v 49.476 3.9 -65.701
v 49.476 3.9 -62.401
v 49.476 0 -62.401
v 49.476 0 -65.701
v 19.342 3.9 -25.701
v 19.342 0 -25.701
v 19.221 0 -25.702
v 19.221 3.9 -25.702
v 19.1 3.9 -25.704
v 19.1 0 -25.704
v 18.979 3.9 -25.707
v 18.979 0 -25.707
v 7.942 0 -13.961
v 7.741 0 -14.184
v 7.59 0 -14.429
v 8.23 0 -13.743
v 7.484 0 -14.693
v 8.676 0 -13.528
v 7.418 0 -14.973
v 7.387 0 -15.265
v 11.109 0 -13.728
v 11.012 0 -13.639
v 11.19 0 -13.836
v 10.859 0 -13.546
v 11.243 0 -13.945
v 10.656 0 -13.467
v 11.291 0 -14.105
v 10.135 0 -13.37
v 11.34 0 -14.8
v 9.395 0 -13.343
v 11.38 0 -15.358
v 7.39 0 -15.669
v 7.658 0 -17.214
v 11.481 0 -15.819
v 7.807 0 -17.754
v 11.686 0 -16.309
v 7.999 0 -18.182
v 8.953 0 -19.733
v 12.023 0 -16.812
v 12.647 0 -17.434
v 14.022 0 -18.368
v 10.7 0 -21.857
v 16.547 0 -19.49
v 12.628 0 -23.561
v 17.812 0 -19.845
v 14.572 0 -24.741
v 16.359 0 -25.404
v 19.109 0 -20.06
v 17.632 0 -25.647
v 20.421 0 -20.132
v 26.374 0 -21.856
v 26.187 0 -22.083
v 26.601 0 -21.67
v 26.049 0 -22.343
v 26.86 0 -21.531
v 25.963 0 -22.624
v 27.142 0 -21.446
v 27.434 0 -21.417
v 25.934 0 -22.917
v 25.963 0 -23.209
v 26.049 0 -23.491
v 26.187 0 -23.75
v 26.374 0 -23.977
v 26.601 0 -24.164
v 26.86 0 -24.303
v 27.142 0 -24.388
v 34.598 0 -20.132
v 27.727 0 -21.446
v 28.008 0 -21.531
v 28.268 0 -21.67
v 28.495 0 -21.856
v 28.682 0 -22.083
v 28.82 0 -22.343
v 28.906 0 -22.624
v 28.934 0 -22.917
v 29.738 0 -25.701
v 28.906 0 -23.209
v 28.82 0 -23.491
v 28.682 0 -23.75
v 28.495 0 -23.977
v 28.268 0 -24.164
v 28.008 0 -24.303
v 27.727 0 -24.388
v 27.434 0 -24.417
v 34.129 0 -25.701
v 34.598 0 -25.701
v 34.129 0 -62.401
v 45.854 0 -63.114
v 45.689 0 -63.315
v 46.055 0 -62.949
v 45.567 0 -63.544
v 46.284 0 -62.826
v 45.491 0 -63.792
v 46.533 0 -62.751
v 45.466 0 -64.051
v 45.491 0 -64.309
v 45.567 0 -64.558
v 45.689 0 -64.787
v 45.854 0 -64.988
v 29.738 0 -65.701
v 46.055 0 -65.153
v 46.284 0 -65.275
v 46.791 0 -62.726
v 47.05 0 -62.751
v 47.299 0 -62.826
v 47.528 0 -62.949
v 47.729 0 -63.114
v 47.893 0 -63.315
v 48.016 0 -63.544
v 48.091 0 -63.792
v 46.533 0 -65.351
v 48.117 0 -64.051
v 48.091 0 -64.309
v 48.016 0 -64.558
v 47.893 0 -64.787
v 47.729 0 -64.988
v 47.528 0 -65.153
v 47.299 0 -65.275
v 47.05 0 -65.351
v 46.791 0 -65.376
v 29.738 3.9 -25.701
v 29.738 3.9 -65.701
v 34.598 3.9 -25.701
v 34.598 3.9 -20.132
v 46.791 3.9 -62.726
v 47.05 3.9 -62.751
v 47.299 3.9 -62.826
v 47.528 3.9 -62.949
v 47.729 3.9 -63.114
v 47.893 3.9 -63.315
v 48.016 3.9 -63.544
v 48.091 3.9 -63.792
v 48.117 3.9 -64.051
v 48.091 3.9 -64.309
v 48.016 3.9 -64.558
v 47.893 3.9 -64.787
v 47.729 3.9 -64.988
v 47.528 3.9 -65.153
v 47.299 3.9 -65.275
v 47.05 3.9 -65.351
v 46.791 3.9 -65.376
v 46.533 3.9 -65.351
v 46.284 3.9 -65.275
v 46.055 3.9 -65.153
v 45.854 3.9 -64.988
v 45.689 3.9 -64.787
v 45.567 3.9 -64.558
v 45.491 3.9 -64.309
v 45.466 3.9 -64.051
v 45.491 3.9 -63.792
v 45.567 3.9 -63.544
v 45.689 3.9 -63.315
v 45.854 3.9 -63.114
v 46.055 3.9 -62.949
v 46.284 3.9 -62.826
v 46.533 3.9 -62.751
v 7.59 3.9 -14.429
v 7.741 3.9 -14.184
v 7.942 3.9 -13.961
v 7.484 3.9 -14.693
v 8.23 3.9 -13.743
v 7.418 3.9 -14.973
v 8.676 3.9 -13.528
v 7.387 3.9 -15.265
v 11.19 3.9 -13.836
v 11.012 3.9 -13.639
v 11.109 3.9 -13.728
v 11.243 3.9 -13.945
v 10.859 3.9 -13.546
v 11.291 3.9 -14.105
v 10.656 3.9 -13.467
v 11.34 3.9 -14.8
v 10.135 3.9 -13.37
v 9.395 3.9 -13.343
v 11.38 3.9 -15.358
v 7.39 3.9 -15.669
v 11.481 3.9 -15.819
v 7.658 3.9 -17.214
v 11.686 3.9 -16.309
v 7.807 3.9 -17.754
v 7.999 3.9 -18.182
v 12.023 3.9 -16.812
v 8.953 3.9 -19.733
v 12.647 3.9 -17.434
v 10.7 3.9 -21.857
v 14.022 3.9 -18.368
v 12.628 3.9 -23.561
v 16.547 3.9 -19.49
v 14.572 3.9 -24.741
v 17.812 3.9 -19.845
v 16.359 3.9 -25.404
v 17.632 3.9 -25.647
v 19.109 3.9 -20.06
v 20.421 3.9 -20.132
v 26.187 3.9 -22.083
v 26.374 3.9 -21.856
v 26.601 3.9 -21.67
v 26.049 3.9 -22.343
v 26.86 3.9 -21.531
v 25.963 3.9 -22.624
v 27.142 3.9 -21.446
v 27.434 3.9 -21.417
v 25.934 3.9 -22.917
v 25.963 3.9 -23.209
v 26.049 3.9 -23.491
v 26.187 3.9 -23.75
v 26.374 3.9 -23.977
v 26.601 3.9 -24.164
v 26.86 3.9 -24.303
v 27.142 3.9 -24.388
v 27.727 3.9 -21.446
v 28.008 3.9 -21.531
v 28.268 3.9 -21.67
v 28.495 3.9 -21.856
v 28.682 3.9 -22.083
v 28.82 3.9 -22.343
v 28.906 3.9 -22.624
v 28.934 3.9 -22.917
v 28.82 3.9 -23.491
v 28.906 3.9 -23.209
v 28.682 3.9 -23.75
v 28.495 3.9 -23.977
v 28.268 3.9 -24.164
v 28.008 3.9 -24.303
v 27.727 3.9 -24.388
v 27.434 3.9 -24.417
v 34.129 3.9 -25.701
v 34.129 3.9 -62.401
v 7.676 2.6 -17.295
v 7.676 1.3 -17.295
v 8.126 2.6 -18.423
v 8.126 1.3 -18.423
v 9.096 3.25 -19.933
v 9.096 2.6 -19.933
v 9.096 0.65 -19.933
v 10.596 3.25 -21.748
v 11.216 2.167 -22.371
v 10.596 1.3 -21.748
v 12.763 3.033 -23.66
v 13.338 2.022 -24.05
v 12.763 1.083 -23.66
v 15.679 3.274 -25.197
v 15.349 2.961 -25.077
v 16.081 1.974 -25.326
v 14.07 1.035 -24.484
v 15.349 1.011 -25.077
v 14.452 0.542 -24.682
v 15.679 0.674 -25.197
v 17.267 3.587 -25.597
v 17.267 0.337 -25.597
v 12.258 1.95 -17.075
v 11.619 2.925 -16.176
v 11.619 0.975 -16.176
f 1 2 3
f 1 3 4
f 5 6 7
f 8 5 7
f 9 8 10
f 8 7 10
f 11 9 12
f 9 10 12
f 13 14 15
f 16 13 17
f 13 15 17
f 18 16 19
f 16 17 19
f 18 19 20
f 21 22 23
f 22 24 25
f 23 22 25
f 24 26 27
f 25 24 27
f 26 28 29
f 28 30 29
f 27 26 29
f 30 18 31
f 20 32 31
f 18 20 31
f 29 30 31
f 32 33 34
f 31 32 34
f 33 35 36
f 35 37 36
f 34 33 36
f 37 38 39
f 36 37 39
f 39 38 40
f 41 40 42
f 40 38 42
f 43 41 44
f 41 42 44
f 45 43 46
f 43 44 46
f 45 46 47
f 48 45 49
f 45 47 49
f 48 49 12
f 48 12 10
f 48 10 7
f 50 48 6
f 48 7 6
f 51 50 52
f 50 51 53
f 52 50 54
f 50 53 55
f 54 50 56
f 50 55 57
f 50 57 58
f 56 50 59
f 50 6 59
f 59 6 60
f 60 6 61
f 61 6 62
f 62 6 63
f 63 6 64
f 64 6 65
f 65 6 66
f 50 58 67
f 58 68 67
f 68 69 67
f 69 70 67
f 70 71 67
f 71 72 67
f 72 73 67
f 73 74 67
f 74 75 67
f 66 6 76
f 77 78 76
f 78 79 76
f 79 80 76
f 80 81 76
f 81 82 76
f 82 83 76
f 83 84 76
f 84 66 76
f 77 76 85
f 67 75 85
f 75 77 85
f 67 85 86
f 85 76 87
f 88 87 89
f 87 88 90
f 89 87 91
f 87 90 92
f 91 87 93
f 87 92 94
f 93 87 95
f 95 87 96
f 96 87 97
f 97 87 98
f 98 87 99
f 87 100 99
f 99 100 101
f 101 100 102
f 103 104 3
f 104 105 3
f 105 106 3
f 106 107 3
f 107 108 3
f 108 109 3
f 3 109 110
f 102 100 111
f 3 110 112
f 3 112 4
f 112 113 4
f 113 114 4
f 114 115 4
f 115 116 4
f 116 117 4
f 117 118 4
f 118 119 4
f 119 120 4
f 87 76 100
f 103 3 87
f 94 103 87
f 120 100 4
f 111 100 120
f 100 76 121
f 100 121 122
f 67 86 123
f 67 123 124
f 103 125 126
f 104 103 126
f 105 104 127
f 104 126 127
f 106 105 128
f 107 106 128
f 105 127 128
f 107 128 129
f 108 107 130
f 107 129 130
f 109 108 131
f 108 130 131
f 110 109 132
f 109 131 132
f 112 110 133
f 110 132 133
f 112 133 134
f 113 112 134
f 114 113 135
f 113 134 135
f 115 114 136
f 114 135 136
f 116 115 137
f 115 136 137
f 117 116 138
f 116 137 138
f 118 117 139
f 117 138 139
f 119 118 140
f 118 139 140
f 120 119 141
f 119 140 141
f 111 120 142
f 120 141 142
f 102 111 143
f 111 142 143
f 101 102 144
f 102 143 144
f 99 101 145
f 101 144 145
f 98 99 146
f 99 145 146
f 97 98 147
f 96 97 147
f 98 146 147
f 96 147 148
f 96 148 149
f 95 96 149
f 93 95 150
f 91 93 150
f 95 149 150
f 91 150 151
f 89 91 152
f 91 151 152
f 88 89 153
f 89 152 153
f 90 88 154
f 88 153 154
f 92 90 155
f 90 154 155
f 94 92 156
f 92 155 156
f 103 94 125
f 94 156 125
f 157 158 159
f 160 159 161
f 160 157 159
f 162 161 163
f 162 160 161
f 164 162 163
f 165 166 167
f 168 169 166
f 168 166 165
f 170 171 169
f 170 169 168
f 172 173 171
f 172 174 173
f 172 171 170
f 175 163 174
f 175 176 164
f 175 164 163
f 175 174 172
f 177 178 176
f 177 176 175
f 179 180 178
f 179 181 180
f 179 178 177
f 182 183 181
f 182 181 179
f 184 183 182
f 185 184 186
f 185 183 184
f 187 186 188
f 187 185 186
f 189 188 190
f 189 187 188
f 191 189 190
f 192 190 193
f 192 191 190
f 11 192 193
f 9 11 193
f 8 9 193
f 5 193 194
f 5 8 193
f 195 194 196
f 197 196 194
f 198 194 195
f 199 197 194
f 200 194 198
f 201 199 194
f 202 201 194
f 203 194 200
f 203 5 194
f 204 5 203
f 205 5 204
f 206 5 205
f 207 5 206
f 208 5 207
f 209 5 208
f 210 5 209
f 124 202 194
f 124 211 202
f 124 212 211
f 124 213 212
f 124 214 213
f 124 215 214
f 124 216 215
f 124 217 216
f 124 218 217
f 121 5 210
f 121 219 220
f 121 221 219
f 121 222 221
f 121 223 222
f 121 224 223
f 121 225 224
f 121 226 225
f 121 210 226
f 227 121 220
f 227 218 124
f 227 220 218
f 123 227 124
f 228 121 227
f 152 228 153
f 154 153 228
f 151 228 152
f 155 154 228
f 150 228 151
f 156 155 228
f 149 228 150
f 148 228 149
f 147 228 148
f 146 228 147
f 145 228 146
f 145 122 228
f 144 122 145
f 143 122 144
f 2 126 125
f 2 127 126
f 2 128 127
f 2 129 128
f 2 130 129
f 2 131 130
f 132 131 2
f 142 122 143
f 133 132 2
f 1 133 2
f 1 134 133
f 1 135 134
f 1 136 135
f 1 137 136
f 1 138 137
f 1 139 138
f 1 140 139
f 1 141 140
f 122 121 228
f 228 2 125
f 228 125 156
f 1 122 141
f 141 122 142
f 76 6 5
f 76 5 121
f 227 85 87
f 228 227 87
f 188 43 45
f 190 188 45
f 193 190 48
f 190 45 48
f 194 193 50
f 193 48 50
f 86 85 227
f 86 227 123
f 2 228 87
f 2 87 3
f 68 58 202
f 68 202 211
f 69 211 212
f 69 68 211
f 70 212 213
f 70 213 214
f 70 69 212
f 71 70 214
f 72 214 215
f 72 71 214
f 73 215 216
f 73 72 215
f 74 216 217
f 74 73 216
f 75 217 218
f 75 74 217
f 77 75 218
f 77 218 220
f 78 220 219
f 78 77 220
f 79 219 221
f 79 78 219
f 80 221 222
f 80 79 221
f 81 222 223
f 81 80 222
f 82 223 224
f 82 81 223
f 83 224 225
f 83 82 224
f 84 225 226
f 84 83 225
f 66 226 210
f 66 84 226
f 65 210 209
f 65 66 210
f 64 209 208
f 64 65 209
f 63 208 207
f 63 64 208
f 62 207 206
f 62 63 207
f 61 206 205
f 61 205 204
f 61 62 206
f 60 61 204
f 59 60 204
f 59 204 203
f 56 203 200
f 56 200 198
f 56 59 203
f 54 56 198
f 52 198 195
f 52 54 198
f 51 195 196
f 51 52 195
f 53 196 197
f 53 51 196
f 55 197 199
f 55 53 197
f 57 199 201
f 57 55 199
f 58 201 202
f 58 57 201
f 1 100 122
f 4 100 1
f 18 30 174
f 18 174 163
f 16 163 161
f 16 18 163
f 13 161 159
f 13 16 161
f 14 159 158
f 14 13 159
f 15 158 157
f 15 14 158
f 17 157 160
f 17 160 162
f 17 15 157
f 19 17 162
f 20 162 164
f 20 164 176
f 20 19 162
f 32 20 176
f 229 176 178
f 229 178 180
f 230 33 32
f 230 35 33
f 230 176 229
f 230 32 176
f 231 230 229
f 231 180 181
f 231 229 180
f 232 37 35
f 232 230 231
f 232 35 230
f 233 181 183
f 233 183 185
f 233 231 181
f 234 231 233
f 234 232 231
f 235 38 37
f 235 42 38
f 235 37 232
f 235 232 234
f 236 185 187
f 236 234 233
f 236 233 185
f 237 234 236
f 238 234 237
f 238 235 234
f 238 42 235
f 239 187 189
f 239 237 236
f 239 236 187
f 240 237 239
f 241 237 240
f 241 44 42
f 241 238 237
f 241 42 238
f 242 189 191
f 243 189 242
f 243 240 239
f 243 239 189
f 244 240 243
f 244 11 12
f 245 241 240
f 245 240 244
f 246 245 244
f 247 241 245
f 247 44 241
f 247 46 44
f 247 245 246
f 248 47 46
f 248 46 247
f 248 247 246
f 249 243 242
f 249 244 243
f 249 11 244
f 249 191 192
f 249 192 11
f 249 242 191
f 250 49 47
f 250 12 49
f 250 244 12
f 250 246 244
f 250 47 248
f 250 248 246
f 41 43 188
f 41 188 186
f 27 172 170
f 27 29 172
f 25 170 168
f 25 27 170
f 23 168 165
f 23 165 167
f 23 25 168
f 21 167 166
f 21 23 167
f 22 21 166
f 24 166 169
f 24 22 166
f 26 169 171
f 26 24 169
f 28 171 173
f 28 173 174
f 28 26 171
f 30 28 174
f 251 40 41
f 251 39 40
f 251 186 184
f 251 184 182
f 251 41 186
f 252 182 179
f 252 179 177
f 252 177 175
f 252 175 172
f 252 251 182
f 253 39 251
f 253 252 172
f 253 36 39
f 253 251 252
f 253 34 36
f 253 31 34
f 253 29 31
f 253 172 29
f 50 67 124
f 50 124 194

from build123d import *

# Parameters (mm, degrees)
SKETCH2_R           = 1.5
SKETCH2_W           = 4.390155439
SKETCH2_H           = 40
BOSS_EXTRUDE1_DEPTH = 3.9
FILLET3_DEPTH       = 3.9
SKETCH3_W           = 19.737208952
SKETCH3_H           = 3.300323738
SKETCH3_R           = 1.325393383
BOSS_EXTRUDE2_DEPTH = 3.9


with BuildPart() as part:
    # Sketch2 → Boss-Extrude1 (new body)
    # profile 1 of 2: a face of its own
    with BuildSketch(Plane(origin=(0, 0, 0), x_dir=(1, 0, 0), z_dir=(0, 1, 0))):
        with BuildLine():
            Line((19.123436496, 25.701081922), (34.59754825, 25.701081922))
            Line((34.59754825, 25.701081922), (34.59754825, 20.132358135))
            Line((34.59754825, 20.132358135), (19.123436496, 20.132358135))
            add(Edge.make_bspline(
                [(19.123436496, 20.132358135), (16.216005931, 19.675871056), (8.717763219, 15.948180567), (12.775822081, 13.309851453), (9.394712639, 13.342677758)],
                knots=[0, 0, 0, 0, 0.368689926, 1, 1, 1, 1], degree=3))
            add(Edge.make_bspline(
                [(9.394712639, 13.342677758), (6.794270731, 13.776084743), (7.423714975, 16.094608856), (7.961055752, 18.618185123), (13.166799439, 25.974660635), (19.123436496, 25.701081922)],
                knots=[0, 0, 0, 0, 0.580649742, 0.680649742, 1, 1, 1, 1], degree=3))
        make_face()
        with Locations(Location((27.434396639, 22.916720028, 0), (0, 0, 270))):
            Circle(SKETCH2_R, mode=Mode.SUBTRACT)
    # profile 2 of 2: a face of its own
    with BuildSketch(Plane(origin=(0, 0, 0), x_dir=(1, 0, 0), z_dir=(0, 1, 0))):
        with Locations((31.933571829, 45.701081922)):
            Rectangle(SKETCH2_W, SKETCH2_H)
    extrude(amount=BOSS_EXTRUDE1_DEPTH)

    # Fillet3: read off the stored shape, not the designer's step
    # Fillet3 outline → Fillet3 (add)
    with BuildSketch(Plane(origin=(0, 0, 0), x_dir=(1, 0, 0), z_dir=(0, 1, 0))):
        with BuildLine():
            Line((19.123436496, 25.701081922), (19.342243741, 25.701081922))
            ThreePointArc((19.342243741, 25.701081922), (19.160798603, 25.702453764), (18.979394951, 25.706568978))
            add(Edge.make_bspline(
                [(18.979394951, 25.706568978), (19.027278337, 25.705120447), (19.075292343, 25.703293105), (19.123436496, 25.701081922)],
                knots=[0.997418871, 0.997418871, 0.997418871, 0.997418871, 1, 1, 1, 1], degree=3))
        make_face()
        with BuildLine():
            add(Edge.make_bspline(
                [(19.123436496, 20.132358135), (18.238088744, 19.993352301), (17.36599214, 19.769234125), (16.54746782, 19.490102613)],
                knots=[0, 0, 0, 0, 0.112270539, 0.112270539, 0.112270539, 0.112270539], degree=3))
            ThreePointArc((16.54746782, 19.490102613), (18.457621126, 19.970705438), (20.420662932, 20.132358135))
            Line((20.420662932, 20.132358135), (19.123436496, 20.132358135))
        make_face()
    extrude(amount=FILLET3_DEPTH)

    # Sketch3 → Boss-Extrude2 (add)
    with BuildSketch(Plane(origin=(0, 3.9, 0), x_dir=(1, 0, 0), z_dir=(0, 1, 0))):
        with Locations((39.607098585, 64.050920053)):
            Rectangle(SKETCH3_W, SKETCH3_H)
        with Locations(Location((46.791397241, 64.050920053, 0), (0, 0, 270))):
            Circle(SKETCH3_R, mode=Mode.SUBTRACT)
    extrude(amount=-BOSS_EXTRUDE2_DEPTH)


solid = part.part
